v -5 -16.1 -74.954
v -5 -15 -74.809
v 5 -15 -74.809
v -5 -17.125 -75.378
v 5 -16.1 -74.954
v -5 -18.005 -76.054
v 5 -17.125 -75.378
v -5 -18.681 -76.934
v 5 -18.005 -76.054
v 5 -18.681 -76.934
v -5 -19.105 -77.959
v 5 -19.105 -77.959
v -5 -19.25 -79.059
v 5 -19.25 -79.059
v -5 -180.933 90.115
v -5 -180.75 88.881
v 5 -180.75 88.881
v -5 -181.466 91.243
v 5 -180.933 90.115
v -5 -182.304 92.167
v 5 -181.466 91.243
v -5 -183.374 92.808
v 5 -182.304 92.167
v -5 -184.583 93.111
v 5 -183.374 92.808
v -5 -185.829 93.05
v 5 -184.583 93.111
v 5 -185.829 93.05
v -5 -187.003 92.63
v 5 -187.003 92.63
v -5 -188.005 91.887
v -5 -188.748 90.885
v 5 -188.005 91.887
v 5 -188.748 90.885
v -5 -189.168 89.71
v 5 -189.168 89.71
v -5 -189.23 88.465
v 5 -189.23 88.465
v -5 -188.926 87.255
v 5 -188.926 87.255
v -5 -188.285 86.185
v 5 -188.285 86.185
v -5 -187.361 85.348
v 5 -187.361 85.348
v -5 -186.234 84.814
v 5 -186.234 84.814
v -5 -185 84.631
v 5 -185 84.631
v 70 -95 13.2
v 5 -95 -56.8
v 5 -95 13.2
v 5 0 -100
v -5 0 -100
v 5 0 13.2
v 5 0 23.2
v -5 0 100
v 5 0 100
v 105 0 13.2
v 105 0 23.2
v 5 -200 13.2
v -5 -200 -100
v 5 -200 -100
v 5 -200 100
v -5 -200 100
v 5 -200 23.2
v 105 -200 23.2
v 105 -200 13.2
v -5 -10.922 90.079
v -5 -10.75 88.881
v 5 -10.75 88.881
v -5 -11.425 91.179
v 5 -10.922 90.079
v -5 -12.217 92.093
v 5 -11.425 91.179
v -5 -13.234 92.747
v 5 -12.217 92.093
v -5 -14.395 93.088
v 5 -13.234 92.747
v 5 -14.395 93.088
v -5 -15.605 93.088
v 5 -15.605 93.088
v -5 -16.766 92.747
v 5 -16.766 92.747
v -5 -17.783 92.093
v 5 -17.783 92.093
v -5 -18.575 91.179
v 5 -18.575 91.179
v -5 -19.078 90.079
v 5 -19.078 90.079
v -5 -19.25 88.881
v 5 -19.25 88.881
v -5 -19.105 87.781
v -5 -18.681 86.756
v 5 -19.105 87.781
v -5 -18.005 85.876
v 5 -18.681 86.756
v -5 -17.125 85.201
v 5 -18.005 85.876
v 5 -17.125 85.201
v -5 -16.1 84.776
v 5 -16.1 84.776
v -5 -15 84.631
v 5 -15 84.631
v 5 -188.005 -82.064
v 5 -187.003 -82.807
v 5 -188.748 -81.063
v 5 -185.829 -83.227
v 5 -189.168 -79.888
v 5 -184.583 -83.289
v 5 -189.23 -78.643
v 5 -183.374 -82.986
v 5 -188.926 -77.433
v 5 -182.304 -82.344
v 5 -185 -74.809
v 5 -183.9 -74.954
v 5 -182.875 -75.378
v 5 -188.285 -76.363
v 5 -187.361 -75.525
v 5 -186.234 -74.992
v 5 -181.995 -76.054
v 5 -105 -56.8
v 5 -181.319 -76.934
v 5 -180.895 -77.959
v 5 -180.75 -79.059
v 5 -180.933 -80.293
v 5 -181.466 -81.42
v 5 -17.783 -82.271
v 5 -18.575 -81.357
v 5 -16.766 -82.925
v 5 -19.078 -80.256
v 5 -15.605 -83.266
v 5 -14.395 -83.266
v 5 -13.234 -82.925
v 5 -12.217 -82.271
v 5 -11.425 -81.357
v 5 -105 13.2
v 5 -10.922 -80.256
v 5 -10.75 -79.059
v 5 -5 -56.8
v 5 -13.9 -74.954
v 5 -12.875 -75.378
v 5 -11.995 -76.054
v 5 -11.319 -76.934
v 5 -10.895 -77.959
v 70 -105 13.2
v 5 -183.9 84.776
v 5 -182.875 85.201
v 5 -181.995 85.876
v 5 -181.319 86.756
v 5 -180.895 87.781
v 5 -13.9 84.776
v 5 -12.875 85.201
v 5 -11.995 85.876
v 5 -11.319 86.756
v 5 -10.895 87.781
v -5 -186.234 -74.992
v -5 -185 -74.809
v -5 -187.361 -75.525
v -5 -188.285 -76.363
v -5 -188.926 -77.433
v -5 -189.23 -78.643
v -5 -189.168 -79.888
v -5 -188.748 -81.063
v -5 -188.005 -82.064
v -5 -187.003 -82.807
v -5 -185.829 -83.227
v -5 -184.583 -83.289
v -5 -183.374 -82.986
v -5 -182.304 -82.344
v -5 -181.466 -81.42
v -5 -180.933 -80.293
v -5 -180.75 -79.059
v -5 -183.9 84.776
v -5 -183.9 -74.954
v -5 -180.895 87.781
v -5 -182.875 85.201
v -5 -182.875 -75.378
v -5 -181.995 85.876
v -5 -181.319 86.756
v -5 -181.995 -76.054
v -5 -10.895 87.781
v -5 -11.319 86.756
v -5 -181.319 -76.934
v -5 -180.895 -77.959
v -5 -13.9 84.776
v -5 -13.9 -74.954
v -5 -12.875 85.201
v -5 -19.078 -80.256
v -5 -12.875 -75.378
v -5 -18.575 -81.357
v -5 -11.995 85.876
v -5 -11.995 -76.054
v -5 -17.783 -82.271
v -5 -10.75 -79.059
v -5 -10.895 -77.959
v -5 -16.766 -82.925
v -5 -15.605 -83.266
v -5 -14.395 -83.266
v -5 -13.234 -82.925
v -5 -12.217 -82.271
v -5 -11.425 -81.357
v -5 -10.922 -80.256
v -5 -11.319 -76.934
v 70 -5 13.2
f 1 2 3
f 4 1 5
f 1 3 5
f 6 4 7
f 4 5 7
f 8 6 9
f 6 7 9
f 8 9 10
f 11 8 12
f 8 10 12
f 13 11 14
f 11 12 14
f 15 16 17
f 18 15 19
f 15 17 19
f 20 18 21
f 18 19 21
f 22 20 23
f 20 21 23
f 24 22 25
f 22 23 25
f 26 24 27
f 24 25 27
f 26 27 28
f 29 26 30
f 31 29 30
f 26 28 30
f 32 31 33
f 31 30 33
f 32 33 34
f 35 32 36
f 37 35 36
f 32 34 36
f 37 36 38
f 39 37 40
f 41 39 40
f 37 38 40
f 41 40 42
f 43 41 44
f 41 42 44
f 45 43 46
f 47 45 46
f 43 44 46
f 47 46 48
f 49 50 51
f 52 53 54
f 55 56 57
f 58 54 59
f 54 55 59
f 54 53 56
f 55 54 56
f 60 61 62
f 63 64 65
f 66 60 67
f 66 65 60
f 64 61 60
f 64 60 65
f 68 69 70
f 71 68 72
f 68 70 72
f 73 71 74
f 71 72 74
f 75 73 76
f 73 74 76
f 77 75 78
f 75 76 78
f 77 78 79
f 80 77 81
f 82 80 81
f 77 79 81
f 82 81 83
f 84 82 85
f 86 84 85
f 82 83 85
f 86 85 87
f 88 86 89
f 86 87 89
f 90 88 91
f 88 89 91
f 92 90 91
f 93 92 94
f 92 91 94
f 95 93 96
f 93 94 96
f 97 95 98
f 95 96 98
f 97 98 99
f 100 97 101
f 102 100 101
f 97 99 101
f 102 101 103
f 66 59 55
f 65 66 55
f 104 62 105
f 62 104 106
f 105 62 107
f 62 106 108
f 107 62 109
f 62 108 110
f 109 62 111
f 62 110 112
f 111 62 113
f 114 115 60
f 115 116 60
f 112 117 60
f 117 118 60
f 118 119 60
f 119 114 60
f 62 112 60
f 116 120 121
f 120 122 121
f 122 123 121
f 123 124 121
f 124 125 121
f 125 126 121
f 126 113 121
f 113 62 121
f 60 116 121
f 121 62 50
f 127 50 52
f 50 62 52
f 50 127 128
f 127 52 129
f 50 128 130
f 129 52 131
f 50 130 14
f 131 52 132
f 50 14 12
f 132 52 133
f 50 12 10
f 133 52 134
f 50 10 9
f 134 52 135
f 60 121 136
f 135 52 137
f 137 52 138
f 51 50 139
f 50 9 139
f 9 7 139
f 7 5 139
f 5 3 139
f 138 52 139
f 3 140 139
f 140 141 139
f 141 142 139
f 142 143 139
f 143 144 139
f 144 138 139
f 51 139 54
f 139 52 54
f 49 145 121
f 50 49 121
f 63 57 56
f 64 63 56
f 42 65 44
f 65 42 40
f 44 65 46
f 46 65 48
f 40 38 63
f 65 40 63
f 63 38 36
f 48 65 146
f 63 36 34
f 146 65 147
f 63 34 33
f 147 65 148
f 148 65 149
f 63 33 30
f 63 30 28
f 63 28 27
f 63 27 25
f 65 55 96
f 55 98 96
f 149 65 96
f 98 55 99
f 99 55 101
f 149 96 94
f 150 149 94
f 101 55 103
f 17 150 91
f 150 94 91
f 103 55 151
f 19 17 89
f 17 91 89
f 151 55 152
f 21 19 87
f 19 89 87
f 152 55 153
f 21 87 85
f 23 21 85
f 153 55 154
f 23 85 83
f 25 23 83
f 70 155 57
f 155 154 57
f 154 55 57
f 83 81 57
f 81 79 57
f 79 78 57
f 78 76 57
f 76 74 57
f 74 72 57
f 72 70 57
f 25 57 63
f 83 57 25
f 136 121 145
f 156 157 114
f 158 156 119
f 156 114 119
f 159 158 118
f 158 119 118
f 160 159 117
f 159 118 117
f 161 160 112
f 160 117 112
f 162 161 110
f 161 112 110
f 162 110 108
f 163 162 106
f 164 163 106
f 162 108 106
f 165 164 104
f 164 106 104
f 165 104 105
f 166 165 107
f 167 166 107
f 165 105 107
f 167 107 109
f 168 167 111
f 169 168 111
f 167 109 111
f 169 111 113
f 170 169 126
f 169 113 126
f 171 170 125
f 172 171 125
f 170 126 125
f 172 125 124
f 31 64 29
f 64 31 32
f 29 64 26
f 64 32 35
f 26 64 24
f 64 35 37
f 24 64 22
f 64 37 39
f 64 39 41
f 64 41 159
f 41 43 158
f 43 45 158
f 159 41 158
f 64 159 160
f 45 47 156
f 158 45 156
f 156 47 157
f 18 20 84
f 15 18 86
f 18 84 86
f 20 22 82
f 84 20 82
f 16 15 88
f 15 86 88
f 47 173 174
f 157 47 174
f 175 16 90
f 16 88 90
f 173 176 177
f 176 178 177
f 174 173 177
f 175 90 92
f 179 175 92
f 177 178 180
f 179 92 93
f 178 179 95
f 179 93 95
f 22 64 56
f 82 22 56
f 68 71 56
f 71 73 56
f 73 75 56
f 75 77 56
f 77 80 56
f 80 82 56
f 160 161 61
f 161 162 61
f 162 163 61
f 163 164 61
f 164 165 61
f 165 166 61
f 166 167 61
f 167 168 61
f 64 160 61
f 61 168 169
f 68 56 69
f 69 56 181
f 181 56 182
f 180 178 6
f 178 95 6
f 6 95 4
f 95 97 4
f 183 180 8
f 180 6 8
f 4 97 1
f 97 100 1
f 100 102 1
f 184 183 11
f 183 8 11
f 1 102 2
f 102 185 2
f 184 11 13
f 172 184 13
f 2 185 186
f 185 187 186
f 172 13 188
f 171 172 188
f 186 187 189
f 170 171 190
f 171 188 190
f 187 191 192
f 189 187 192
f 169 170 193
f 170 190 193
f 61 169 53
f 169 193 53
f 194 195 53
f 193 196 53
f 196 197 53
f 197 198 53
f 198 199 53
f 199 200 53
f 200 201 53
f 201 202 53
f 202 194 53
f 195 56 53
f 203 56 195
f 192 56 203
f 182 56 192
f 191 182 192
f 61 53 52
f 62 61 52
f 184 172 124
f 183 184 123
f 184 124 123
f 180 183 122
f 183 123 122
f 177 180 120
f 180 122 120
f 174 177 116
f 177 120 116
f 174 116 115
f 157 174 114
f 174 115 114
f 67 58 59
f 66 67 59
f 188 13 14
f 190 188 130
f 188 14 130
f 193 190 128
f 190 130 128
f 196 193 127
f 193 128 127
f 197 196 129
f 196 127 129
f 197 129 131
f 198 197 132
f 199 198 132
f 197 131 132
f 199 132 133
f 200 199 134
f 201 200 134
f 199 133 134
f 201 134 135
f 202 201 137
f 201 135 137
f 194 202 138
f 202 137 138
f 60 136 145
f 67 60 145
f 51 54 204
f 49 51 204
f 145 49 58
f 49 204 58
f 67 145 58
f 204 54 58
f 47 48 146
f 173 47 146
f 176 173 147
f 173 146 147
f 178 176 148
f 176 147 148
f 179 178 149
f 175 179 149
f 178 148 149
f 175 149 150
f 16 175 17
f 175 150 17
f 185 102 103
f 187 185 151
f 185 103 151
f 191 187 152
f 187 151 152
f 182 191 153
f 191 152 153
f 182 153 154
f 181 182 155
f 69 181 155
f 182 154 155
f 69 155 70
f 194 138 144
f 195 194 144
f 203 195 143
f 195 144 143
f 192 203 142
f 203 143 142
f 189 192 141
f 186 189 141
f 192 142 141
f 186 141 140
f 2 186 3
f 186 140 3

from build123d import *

# Parameters (mm, degrees)
F1_DEPTH = 200
F2_W     = 10
F2_H     = 70
F3_DEPTH = 70
F5_DEPTH = 100
F6_DEPTH = 75.001


with BuildPart() as f1:
    # F0 (on Front) → F1 (new body)
    with BuildSketch(Plane.XZ):
        Polygon((5, 100), (-5, 100), (-5, 23.2), (-5, 13.2), (-5, -100), (5, -100), (5, 13.2), (105, 13.2), (105, 23.2), (5, 23.2), align=None)
    extrude(amount=F1_DEPTH)

    # F2 (on Right) → F3 (join)
    with BuildSketch(Plane.YZ):
        with Locations((-100, -21.8)):
            Rectangle(F2_W, F2_H)
        with BuildLine():
            Line((-185, 84.6313585043), (-185, 88.8813585043))
            Line((-185, 88.8813585043), (-180.75, 88.8813585043))
            ThreePointArc((-180.75, 88.8813585043), (-188.00520382, 91.8865623243), (-185, 84.6313585043))
        make_face()
        with BuildLine():
            Line((-180.75, 88.8813585043), (-185, 88.8813585043))
            Line((-185, 88.8813585043), (-185, 84.6313585043))
            ThreePointArc((-185, 84.6313585043), (-181.99479618, 85.8761546843), (-180.75, 88.8813585043))
        make_face()
        with BuildLine():
            Line((-185, -74.8090941906), (-185, -79.0590941906))
            Line((-185, -79.0590941906), (-180.75, -79.0590941906))
            ThreePointArc((-180.75, -79.0590941906), (-181.99479618, -76.0538903706), (-185, -74.8090941906))
        make_face()
        with BuildLine():
            Line((-180.75, -79.0590941906), (-185, -79.0590941906))
            Line((-185, -79.0590941906), (-185, -74.8090941906))
            ThreePointArc((-185, -74.8090941906), (-188.00520382, -82.0642980106), (-180.75, -79.0590941906))
        make_face()
        with BuildLine():
            Line((-19.25, -79.0590941906), (-15, -79.0590941906))
            Line((-15, -79.0590941906), (-15, -74.8090941906))
            ThreePointArc((-15, -74.8090941906), (-18.00520382, -76.0538903706), (-19.25, -79.0590941906))
        make_face()
        with BuildLine():
            Line((-15, -74.8090941906), (-15, -79.0590941906))
            Line((-15, -79.0590941906), (-19.25, -79.0590941906))
            ThreePointArc((-19.25, -79.0590941906), (-15, -83.3090941906), (-10.75, -79.0590941906))
            ThreePointArc((-10.75, -79.0590941906), (-11.99479618, -76.0538903706), (-15, -74.8090941906))
        make_face()
        with BuildLine():
            ThreePointArc((-15, 84.6313585043), (-11.99479618, 85.8761546843), (-10.75, 88.8813585043))
            ThreePointArc((-10.75, 88.8813585043), (-15, 93.1313585043), (-19.25, 88.8813585043))
            Line((-19.25, 88.8813585043), (-15, 88.8813585043))
            Line((-15, 88.8813585043), (-15, 84.6313585043))
        make_face()
        with BuildLine():
            Line((-15, 88.8813585043), (-19.25, 88.8813585043))
            ThreePointArc((-19.25, 88.8813585043), (-18.00520382, 85.8761546843), (-15, 84.6313585043))
            Line((-15, 84.6313585043), (-15, 88.8813585043))
        make_face()
    extrude(amount=F3_DEPTH)

    # F4 (on face) → F5 (cut)
    with BuildSketch(Plane.XZ.offset(105)):
        Polygon((5, -56.8), (70, -56.8), (70, 13.2), align=None)
    extrude(amount=-F5_DEPTH, mode=Mode.SUBTRACT)

    # F6 (cut, through all): faces of the model
    f6_faces = [f1.faces().sort_by_distance(p)[0] for p in [
        (70, -185, 88.8813585043),
        (70, -15, 88.8813585043),
        (70, -15, -79.0590941906),
        (70, -185, -79.0590941906),
    ]]
    extrude(f6_faces, amount=-F6_DEPTH, mode=Mode.SUBTRACT)


solid = f1.part
